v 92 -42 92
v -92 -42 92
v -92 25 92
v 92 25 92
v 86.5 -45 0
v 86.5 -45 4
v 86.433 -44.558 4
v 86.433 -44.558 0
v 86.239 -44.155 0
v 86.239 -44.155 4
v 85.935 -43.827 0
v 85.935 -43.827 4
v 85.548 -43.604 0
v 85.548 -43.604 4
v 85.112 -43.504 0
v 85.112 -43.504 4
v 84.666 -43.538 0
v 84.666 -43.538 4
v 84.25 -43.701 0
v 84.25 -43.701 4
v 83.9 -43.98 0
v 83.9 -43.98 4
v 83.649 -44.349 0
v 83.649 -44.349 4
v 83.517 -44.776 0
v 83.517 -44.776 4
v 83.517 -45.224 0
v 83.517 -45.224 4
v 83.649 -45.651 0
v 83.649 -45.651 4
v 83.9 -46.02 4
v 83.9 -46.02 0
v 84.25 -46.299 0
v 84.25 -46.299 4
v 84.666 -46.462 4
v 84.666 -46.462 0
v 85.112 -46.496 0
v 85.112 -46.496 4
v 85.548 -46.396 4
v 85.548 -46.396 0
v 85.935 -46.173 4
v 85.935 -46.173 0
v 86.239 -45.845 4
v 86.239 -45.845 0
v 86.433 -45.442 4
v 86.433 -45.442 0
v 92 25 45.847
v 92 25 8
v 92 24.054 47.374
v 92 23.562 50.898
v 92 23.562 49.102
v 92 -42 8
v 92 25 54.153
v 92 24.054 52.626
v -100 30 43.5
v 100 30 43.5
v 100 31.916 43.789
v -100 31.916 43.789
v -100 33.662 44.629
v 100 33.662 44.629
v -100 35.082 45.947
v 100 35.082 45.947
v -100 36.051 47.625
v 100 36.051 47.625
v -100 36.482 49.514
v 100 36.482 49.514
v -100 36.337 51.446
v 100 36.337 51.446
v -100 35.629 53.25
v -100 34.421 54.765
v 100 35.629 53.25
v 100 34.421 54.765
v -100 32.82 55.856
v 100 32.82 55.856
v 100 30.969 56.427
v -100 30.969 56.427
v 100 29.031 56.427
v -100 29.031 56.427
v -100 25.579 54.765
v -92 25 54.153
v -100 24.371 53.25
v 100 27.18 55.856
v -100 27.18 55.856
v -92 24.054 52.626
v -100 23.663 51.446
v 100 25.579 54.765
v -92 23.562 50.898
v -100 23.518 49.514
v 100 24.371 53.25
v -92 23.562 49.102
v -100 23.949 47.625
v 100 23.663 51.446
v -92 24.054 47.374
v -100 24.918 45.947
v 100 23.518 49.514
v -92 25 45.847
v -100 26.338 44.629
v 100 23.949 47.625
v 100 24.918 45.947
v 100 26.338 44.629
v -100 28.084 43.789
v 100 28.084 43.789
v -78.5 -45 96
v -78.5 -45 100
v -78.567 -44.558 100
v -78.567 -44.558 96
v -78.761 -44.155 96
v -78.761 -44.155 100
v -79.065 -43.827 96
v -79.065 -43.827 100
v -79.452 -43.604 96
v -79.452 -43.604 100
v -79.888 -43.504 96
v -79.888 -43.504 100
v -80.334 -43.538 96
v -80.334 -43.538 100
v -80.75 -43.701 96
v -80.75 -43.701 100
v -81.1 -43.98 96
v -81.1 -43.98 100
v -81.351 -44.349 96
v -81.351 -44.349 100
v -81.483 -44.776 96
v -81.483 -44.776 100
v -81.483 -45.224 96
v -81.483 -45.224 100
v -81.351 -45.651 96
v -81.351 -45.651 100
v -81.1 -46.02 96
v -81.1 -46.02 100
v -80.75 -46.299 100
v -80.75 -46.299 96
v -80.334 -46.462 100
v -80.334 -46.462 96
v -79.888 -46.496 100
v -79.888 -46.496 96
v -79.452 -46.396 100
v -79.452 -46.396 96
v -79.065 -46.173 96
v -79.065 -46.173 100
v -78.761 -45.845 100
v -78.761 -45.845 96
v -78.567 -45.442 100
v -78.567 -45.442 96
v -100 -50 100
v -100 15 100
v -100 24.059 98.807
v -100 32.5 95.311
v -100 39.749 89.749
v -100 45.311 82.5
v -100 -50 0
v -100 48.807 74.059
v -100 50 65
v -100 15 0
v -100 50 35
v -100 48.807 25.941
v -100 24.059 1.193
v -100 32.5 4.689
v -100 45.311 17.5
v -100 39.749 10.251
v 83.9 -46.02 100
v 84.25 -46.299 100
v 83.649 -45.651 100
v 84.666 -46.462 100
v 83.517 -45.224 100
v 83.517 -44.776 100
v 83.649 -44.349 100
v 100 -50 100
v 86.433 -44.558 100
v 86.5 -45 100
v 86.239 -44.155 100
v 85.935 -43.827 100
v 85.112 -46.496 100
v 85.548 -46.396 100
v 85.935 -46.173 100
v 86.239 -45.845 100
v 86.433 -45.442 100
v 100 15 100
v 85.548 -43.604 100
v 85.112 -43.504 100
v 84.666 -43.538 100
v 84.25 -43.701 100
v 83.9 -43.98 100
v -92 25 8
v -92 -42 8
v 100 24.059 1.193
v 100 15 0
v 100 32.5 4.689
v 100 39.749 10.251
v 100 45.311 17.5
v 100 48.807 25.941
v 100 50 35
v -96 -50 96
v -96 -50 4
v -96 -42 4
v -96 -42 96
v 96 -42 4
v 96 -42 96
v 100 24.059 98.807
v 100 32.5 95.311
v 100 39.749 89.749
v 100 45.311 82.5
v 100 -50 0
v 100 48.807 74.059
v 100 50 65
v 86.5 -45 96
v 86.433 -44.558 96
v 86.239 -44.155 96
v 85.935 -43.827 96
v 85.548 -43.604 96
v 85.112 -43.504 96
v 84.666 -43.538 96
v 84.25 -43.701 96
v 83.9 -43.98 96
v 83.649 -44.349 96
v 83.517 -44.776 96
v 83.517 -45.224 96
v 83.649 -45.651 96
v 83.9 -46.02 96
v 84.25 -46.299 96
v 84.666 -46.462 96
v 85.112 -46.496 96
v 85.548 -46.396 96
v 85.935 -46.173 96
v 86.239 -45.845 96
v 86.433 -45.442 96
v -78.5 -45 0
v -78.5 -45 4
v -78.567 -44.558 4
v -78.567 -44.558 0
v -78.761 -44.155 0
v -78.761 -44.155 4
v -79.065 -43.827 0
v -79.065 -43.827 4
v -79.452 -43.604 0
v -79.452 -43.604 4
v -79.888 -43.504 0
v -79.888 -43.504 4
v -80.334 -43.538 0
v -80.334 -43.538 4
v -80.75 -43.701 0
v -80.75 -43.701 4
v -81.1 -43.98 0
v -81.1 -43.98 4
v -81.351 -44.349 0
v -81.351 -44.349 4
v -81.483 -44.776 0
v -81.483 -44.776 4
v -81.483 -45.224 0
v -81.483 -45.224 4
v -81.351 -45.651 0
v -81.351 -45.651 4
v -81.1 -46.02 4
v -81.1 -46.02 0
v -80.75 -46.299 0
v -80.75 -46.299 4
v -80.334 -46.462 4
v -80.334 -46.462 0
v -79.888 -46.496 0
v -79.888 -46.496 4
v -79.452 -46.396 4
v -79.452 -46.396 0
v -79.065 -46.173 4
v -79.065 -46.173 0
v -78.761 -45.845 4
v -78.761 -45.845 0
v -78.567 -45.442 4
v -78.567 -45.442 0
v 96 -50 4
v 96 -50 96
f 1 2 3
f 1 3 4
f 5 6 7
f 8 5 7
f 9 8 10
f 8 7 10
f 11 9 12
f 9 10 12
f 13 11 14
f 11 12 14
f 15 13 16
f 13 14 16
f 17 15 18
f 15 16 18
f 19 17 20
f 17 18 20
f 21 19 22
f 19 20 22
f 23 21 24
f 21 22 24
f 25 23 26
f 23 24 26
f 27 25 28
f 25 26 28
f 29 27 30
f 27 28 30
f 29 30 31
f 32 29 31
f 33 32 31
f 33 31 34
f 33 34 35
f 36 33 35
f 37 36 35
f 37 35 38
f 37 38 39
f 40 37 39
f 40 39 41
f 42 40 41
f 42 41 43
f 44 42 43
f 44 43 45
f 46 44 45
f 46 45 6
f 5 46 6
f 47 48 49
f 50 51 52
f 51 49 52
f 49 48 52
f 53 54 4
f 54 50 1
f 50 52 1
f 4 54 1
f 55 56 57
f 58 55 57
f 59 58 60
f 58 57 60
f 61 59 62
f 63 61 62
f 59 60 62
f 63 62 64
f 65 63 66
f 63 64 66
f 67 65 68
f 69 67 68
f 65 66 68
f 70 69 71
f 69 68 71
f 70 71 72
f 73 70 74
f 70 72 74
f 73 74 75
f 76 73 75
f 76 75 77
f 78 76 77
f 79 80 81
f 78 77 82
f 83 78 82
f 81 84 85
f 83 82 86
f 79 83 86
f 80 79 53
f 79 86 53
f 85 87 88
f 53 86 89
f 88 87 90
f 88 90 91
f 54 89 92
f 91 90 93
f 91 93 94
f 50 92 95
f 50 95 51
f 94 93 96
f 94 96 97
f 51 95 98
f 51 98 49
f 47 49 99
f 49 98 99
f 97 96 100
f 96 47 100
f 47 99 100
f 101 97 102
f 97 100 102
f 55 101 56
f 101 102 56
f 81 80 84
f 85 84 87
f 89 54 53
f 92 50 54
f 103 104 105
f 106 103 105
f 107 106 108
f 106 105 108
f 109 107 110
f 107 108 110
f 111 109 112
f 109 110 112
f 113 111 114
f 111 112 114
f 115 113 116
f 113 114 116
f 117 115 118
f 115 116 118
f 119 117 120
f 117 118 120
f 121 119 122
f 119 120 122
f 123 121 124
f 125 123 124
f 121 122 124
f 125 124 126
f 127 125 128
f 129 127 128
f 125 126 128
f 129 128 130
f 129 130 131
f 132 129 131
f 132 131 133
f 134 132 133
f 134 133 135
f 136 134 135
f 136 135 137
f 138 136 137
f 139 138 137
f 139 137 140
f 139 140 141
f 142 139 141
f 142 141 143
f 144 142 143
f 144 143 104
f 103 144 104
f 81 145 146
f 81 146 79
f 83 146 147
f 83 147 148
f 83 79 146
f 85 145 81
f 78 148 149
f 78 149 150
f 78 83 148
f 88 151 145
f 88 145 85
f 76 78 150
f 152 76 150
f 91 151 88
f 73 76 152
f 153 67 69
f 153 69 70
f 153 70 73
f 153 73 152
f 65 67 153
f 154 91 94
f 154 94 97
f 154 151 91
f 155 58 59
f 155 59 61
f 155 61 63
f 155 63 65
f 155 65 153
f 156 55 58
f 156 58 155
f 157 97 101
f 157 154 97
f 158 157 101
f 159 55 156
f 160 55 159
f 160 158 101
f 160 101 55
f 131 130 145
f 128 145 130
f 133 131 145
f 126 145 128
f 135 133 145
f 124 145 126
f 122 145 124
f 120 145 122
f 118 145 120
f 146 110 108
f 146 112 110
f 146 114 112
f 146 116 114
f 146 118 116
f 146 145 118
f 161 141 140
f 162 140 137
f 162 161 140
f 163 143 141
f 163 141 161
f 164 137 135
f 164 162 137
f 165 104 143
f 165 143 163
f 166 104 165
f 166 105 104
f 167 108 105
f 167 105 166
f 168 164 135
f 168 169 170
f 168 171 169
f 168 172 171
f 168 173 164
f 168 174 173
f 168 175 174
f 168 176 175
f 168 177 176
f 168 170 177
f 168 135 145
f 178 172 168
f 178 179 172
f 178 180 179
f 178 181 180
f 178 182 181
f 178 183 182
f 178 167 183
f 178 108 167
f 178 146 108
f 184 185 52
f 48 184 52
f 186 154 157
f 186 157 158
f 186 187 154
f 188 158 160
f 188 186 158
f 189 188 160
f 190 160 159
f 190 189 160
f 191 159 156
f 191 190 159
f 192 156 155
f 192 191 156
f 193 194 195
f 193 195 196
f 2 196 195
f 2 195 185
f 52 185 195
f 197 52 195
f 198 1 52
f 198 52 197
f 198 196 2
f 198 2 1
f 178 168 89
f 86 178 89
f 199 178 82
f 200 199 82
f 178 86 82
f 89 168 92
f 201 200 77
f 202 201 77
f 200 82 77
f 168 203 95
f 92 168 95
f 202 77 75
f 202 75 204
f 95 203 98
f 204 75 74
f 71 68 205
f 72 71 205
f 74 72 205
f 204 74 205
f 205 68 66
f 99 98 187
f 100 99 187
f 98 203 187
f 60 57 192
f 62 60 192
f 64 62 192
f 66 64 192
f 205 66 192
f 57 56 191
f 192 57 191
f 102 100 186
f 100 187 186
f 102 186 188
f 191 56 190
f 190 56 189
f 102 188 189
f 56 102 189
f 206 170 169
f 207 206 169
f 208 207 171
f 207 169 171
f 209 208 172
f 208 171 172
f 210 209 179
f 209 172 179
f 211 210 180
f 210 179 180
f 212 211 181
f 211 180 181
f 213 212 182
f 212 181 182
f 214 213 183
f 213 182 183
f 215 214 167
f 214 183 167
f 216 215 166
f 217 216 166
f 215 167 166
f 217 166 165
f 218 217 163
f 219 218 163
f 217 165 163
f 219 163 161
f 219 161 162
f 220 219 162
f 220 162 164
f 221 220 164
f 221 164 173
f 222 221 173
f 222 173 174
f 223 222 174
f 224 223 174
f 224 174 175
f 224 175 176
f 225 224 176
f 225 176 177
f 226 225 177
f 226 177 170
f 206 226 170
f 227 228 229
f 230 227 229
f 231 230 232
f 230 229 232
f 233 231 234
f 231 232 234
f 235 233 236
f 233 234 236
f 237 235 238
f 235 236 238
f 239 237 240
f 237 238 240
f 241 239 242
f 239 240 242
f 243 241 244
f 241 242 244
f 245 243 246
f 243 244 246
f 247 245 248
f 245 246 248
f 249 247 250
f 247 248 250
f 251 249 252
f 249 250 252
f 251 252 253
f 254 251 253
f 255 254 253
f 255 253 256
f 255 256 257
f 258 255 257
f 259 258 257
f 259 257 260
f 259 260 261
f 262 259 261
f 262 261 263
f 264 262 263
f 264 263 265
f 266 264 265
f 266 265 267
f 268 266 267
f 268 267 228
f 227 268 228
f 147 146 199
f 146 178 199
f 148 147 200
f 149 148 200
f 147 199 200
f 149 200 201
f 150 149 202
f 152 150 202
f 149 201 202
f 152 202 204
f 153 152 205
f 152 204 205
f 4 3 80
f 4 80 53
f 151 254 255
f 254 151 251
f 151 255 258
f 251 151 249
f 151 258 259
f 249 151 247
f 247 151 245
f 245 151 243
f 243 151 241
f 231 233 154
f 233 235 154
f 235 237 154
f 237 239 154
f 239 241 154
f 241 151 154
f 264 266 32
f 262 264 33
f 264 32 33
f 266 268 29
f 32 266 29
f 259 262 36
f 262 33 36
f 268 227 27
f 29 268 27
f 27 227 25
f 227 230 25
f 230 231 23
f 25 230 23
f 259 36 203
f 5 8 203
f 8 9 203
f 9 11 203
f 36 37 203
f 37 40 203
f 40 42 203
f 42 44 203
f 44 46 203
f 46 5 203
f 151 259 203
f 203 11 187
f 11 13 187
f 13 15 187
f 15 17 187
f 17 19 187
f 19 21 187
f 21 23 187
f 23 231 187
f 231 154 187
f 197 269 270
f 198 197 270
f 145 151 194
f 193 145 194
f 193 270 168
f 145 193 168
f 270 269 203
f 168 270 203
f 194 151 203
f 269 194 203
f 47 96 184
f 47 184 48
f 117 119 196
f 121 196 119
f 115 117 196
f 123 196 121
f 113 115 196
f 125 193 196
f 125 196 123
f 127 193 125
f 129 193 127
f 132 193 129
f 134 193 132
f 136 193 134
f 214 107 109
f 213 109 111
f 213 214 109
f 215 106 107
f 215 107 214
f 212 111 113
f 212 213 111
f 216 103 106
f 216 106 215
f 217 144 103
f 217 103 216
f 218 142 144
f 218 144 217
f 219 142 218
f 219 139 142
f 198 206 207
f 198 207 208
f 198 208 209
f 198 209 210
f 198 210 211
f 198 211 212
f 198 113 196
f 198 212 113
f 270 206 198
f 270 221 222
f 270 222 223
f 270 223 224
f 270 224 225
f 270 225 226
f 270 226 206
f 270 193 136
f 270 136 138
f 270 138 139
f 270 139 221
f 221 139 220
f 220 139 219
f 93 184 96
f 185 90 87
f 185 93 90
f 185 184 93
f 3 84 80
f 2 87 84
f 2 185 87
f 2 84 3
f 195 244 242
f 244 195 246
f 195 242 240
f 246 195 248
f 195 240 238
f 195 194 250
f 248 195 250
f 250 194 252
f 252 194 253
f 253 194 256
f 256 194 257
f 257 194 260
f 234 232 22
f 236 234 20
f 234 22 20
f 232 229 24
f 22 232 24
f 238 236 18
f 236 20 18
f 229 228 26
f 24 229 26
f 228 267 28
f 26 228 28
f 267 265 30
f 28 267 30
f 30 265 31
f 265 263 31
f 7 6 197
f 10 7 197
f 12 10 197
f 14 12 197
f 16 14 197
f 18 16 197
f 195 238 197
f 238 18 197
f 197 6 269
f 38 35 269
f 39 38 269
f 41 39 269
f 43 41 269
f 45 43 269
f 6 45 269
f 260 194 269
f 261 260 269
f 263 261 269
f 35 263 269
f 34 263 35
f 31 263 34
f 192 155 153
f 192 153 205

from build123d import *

# Parameters (mm, degrees)
ESQUISSE1_W             = 200
ESQUISSE1_H             = 100
BOSS_EXTRU_1_DEPTH      = 100
ESQUISSE2_R             = 6.5
ENL_V_MAT_EXTRU_1_DEPTH = 230.128784748
ESQUISSE4_R             = 1.5
ENL_V_MAT_EXTRU_3_DEPTH = 151
ESQUISSE8_W             = 184
ESQUISSE8_H             = 84
ENL_V_MAT_EXTRU_8_DEPTH = 75
ESQUISSE9_W             = 192
ESQUISSE9_H             = 92
ENL_V_MAT_EXTRU_9_DEPTH = 8
CONG_2_R                = 35


with BuildPart() as part:
    # Esquisse1 → Boss.-Extru.1 (new body)
    with BuildSketch(Plane.XY):
        Rectangle(ESQUISSE1_W, ESQUISSE1_H)
    extrude(amount=BOSS_EXTRU_1_DEPTH)

    # Esquisse2 → Enlèv. mat.-Extru.1 (cut, through all)
    with BuildSketch(Plane(origin=(100, 0, 0), x_dir=(0, 0, -1), z_dir=(1, 0, 0))):
        with Locations((-50, 30)):
            Circle(ESQUISSE2_R)
    extrude(amount=-ENL_V_MAT_EXTRU_1_DEPTH, mode=Mode.SUBTRACT)

    # Esquisse4 → Enlèv. mat.-Extru.3 (cut, through all)
    with BuildSketch(Plane.XY.offset(100)):
        with Locations((85, -45)):
            Circle(ESQUISSE4_R)
        with Locations((-80, -45)):
            Circle(ESQUISSE4_R)
    extrude(amount=-ENL_V_MAT_EXTRU_3_DEPTH, mode=Mode.SUBTRACT)

    # Esquisse8 → Enlèv. mat.-Extru.8 (cut)
    with BuildSketch(Plane.XZ.offset(50)):
        with Locations((0, 50)):
            Rectangle(ESQUISSE8_W, ESQUISSE8_H)
    extrude(amount=-ENL_V_MAT_EXTRU_8_DEPTH, mode=Mode.SUBTRACT)

    # Esquisse9 → Enlèv. mat.-Extru.9 (cut)
    with BuildSketch(Plane.XZ.offset(50)):
        with Locations((0, 50)):
            Rectangle(ESQUISSE9_W, ESQUISSE9_H)
    extrude(amount=-ENL_V_MAT_EXTRU_9_DEPTH, mode=Mode.SUBTRACT)

    # Congé2
    cong_2_edges = [part.edges().sort_by_distance(p)[0] for p in [
        (0, 50, 100),
        (0, 50, 0),
    ]]
    fillet(cong_2_edges, radius=CONG_2_R)


solid = part.part
